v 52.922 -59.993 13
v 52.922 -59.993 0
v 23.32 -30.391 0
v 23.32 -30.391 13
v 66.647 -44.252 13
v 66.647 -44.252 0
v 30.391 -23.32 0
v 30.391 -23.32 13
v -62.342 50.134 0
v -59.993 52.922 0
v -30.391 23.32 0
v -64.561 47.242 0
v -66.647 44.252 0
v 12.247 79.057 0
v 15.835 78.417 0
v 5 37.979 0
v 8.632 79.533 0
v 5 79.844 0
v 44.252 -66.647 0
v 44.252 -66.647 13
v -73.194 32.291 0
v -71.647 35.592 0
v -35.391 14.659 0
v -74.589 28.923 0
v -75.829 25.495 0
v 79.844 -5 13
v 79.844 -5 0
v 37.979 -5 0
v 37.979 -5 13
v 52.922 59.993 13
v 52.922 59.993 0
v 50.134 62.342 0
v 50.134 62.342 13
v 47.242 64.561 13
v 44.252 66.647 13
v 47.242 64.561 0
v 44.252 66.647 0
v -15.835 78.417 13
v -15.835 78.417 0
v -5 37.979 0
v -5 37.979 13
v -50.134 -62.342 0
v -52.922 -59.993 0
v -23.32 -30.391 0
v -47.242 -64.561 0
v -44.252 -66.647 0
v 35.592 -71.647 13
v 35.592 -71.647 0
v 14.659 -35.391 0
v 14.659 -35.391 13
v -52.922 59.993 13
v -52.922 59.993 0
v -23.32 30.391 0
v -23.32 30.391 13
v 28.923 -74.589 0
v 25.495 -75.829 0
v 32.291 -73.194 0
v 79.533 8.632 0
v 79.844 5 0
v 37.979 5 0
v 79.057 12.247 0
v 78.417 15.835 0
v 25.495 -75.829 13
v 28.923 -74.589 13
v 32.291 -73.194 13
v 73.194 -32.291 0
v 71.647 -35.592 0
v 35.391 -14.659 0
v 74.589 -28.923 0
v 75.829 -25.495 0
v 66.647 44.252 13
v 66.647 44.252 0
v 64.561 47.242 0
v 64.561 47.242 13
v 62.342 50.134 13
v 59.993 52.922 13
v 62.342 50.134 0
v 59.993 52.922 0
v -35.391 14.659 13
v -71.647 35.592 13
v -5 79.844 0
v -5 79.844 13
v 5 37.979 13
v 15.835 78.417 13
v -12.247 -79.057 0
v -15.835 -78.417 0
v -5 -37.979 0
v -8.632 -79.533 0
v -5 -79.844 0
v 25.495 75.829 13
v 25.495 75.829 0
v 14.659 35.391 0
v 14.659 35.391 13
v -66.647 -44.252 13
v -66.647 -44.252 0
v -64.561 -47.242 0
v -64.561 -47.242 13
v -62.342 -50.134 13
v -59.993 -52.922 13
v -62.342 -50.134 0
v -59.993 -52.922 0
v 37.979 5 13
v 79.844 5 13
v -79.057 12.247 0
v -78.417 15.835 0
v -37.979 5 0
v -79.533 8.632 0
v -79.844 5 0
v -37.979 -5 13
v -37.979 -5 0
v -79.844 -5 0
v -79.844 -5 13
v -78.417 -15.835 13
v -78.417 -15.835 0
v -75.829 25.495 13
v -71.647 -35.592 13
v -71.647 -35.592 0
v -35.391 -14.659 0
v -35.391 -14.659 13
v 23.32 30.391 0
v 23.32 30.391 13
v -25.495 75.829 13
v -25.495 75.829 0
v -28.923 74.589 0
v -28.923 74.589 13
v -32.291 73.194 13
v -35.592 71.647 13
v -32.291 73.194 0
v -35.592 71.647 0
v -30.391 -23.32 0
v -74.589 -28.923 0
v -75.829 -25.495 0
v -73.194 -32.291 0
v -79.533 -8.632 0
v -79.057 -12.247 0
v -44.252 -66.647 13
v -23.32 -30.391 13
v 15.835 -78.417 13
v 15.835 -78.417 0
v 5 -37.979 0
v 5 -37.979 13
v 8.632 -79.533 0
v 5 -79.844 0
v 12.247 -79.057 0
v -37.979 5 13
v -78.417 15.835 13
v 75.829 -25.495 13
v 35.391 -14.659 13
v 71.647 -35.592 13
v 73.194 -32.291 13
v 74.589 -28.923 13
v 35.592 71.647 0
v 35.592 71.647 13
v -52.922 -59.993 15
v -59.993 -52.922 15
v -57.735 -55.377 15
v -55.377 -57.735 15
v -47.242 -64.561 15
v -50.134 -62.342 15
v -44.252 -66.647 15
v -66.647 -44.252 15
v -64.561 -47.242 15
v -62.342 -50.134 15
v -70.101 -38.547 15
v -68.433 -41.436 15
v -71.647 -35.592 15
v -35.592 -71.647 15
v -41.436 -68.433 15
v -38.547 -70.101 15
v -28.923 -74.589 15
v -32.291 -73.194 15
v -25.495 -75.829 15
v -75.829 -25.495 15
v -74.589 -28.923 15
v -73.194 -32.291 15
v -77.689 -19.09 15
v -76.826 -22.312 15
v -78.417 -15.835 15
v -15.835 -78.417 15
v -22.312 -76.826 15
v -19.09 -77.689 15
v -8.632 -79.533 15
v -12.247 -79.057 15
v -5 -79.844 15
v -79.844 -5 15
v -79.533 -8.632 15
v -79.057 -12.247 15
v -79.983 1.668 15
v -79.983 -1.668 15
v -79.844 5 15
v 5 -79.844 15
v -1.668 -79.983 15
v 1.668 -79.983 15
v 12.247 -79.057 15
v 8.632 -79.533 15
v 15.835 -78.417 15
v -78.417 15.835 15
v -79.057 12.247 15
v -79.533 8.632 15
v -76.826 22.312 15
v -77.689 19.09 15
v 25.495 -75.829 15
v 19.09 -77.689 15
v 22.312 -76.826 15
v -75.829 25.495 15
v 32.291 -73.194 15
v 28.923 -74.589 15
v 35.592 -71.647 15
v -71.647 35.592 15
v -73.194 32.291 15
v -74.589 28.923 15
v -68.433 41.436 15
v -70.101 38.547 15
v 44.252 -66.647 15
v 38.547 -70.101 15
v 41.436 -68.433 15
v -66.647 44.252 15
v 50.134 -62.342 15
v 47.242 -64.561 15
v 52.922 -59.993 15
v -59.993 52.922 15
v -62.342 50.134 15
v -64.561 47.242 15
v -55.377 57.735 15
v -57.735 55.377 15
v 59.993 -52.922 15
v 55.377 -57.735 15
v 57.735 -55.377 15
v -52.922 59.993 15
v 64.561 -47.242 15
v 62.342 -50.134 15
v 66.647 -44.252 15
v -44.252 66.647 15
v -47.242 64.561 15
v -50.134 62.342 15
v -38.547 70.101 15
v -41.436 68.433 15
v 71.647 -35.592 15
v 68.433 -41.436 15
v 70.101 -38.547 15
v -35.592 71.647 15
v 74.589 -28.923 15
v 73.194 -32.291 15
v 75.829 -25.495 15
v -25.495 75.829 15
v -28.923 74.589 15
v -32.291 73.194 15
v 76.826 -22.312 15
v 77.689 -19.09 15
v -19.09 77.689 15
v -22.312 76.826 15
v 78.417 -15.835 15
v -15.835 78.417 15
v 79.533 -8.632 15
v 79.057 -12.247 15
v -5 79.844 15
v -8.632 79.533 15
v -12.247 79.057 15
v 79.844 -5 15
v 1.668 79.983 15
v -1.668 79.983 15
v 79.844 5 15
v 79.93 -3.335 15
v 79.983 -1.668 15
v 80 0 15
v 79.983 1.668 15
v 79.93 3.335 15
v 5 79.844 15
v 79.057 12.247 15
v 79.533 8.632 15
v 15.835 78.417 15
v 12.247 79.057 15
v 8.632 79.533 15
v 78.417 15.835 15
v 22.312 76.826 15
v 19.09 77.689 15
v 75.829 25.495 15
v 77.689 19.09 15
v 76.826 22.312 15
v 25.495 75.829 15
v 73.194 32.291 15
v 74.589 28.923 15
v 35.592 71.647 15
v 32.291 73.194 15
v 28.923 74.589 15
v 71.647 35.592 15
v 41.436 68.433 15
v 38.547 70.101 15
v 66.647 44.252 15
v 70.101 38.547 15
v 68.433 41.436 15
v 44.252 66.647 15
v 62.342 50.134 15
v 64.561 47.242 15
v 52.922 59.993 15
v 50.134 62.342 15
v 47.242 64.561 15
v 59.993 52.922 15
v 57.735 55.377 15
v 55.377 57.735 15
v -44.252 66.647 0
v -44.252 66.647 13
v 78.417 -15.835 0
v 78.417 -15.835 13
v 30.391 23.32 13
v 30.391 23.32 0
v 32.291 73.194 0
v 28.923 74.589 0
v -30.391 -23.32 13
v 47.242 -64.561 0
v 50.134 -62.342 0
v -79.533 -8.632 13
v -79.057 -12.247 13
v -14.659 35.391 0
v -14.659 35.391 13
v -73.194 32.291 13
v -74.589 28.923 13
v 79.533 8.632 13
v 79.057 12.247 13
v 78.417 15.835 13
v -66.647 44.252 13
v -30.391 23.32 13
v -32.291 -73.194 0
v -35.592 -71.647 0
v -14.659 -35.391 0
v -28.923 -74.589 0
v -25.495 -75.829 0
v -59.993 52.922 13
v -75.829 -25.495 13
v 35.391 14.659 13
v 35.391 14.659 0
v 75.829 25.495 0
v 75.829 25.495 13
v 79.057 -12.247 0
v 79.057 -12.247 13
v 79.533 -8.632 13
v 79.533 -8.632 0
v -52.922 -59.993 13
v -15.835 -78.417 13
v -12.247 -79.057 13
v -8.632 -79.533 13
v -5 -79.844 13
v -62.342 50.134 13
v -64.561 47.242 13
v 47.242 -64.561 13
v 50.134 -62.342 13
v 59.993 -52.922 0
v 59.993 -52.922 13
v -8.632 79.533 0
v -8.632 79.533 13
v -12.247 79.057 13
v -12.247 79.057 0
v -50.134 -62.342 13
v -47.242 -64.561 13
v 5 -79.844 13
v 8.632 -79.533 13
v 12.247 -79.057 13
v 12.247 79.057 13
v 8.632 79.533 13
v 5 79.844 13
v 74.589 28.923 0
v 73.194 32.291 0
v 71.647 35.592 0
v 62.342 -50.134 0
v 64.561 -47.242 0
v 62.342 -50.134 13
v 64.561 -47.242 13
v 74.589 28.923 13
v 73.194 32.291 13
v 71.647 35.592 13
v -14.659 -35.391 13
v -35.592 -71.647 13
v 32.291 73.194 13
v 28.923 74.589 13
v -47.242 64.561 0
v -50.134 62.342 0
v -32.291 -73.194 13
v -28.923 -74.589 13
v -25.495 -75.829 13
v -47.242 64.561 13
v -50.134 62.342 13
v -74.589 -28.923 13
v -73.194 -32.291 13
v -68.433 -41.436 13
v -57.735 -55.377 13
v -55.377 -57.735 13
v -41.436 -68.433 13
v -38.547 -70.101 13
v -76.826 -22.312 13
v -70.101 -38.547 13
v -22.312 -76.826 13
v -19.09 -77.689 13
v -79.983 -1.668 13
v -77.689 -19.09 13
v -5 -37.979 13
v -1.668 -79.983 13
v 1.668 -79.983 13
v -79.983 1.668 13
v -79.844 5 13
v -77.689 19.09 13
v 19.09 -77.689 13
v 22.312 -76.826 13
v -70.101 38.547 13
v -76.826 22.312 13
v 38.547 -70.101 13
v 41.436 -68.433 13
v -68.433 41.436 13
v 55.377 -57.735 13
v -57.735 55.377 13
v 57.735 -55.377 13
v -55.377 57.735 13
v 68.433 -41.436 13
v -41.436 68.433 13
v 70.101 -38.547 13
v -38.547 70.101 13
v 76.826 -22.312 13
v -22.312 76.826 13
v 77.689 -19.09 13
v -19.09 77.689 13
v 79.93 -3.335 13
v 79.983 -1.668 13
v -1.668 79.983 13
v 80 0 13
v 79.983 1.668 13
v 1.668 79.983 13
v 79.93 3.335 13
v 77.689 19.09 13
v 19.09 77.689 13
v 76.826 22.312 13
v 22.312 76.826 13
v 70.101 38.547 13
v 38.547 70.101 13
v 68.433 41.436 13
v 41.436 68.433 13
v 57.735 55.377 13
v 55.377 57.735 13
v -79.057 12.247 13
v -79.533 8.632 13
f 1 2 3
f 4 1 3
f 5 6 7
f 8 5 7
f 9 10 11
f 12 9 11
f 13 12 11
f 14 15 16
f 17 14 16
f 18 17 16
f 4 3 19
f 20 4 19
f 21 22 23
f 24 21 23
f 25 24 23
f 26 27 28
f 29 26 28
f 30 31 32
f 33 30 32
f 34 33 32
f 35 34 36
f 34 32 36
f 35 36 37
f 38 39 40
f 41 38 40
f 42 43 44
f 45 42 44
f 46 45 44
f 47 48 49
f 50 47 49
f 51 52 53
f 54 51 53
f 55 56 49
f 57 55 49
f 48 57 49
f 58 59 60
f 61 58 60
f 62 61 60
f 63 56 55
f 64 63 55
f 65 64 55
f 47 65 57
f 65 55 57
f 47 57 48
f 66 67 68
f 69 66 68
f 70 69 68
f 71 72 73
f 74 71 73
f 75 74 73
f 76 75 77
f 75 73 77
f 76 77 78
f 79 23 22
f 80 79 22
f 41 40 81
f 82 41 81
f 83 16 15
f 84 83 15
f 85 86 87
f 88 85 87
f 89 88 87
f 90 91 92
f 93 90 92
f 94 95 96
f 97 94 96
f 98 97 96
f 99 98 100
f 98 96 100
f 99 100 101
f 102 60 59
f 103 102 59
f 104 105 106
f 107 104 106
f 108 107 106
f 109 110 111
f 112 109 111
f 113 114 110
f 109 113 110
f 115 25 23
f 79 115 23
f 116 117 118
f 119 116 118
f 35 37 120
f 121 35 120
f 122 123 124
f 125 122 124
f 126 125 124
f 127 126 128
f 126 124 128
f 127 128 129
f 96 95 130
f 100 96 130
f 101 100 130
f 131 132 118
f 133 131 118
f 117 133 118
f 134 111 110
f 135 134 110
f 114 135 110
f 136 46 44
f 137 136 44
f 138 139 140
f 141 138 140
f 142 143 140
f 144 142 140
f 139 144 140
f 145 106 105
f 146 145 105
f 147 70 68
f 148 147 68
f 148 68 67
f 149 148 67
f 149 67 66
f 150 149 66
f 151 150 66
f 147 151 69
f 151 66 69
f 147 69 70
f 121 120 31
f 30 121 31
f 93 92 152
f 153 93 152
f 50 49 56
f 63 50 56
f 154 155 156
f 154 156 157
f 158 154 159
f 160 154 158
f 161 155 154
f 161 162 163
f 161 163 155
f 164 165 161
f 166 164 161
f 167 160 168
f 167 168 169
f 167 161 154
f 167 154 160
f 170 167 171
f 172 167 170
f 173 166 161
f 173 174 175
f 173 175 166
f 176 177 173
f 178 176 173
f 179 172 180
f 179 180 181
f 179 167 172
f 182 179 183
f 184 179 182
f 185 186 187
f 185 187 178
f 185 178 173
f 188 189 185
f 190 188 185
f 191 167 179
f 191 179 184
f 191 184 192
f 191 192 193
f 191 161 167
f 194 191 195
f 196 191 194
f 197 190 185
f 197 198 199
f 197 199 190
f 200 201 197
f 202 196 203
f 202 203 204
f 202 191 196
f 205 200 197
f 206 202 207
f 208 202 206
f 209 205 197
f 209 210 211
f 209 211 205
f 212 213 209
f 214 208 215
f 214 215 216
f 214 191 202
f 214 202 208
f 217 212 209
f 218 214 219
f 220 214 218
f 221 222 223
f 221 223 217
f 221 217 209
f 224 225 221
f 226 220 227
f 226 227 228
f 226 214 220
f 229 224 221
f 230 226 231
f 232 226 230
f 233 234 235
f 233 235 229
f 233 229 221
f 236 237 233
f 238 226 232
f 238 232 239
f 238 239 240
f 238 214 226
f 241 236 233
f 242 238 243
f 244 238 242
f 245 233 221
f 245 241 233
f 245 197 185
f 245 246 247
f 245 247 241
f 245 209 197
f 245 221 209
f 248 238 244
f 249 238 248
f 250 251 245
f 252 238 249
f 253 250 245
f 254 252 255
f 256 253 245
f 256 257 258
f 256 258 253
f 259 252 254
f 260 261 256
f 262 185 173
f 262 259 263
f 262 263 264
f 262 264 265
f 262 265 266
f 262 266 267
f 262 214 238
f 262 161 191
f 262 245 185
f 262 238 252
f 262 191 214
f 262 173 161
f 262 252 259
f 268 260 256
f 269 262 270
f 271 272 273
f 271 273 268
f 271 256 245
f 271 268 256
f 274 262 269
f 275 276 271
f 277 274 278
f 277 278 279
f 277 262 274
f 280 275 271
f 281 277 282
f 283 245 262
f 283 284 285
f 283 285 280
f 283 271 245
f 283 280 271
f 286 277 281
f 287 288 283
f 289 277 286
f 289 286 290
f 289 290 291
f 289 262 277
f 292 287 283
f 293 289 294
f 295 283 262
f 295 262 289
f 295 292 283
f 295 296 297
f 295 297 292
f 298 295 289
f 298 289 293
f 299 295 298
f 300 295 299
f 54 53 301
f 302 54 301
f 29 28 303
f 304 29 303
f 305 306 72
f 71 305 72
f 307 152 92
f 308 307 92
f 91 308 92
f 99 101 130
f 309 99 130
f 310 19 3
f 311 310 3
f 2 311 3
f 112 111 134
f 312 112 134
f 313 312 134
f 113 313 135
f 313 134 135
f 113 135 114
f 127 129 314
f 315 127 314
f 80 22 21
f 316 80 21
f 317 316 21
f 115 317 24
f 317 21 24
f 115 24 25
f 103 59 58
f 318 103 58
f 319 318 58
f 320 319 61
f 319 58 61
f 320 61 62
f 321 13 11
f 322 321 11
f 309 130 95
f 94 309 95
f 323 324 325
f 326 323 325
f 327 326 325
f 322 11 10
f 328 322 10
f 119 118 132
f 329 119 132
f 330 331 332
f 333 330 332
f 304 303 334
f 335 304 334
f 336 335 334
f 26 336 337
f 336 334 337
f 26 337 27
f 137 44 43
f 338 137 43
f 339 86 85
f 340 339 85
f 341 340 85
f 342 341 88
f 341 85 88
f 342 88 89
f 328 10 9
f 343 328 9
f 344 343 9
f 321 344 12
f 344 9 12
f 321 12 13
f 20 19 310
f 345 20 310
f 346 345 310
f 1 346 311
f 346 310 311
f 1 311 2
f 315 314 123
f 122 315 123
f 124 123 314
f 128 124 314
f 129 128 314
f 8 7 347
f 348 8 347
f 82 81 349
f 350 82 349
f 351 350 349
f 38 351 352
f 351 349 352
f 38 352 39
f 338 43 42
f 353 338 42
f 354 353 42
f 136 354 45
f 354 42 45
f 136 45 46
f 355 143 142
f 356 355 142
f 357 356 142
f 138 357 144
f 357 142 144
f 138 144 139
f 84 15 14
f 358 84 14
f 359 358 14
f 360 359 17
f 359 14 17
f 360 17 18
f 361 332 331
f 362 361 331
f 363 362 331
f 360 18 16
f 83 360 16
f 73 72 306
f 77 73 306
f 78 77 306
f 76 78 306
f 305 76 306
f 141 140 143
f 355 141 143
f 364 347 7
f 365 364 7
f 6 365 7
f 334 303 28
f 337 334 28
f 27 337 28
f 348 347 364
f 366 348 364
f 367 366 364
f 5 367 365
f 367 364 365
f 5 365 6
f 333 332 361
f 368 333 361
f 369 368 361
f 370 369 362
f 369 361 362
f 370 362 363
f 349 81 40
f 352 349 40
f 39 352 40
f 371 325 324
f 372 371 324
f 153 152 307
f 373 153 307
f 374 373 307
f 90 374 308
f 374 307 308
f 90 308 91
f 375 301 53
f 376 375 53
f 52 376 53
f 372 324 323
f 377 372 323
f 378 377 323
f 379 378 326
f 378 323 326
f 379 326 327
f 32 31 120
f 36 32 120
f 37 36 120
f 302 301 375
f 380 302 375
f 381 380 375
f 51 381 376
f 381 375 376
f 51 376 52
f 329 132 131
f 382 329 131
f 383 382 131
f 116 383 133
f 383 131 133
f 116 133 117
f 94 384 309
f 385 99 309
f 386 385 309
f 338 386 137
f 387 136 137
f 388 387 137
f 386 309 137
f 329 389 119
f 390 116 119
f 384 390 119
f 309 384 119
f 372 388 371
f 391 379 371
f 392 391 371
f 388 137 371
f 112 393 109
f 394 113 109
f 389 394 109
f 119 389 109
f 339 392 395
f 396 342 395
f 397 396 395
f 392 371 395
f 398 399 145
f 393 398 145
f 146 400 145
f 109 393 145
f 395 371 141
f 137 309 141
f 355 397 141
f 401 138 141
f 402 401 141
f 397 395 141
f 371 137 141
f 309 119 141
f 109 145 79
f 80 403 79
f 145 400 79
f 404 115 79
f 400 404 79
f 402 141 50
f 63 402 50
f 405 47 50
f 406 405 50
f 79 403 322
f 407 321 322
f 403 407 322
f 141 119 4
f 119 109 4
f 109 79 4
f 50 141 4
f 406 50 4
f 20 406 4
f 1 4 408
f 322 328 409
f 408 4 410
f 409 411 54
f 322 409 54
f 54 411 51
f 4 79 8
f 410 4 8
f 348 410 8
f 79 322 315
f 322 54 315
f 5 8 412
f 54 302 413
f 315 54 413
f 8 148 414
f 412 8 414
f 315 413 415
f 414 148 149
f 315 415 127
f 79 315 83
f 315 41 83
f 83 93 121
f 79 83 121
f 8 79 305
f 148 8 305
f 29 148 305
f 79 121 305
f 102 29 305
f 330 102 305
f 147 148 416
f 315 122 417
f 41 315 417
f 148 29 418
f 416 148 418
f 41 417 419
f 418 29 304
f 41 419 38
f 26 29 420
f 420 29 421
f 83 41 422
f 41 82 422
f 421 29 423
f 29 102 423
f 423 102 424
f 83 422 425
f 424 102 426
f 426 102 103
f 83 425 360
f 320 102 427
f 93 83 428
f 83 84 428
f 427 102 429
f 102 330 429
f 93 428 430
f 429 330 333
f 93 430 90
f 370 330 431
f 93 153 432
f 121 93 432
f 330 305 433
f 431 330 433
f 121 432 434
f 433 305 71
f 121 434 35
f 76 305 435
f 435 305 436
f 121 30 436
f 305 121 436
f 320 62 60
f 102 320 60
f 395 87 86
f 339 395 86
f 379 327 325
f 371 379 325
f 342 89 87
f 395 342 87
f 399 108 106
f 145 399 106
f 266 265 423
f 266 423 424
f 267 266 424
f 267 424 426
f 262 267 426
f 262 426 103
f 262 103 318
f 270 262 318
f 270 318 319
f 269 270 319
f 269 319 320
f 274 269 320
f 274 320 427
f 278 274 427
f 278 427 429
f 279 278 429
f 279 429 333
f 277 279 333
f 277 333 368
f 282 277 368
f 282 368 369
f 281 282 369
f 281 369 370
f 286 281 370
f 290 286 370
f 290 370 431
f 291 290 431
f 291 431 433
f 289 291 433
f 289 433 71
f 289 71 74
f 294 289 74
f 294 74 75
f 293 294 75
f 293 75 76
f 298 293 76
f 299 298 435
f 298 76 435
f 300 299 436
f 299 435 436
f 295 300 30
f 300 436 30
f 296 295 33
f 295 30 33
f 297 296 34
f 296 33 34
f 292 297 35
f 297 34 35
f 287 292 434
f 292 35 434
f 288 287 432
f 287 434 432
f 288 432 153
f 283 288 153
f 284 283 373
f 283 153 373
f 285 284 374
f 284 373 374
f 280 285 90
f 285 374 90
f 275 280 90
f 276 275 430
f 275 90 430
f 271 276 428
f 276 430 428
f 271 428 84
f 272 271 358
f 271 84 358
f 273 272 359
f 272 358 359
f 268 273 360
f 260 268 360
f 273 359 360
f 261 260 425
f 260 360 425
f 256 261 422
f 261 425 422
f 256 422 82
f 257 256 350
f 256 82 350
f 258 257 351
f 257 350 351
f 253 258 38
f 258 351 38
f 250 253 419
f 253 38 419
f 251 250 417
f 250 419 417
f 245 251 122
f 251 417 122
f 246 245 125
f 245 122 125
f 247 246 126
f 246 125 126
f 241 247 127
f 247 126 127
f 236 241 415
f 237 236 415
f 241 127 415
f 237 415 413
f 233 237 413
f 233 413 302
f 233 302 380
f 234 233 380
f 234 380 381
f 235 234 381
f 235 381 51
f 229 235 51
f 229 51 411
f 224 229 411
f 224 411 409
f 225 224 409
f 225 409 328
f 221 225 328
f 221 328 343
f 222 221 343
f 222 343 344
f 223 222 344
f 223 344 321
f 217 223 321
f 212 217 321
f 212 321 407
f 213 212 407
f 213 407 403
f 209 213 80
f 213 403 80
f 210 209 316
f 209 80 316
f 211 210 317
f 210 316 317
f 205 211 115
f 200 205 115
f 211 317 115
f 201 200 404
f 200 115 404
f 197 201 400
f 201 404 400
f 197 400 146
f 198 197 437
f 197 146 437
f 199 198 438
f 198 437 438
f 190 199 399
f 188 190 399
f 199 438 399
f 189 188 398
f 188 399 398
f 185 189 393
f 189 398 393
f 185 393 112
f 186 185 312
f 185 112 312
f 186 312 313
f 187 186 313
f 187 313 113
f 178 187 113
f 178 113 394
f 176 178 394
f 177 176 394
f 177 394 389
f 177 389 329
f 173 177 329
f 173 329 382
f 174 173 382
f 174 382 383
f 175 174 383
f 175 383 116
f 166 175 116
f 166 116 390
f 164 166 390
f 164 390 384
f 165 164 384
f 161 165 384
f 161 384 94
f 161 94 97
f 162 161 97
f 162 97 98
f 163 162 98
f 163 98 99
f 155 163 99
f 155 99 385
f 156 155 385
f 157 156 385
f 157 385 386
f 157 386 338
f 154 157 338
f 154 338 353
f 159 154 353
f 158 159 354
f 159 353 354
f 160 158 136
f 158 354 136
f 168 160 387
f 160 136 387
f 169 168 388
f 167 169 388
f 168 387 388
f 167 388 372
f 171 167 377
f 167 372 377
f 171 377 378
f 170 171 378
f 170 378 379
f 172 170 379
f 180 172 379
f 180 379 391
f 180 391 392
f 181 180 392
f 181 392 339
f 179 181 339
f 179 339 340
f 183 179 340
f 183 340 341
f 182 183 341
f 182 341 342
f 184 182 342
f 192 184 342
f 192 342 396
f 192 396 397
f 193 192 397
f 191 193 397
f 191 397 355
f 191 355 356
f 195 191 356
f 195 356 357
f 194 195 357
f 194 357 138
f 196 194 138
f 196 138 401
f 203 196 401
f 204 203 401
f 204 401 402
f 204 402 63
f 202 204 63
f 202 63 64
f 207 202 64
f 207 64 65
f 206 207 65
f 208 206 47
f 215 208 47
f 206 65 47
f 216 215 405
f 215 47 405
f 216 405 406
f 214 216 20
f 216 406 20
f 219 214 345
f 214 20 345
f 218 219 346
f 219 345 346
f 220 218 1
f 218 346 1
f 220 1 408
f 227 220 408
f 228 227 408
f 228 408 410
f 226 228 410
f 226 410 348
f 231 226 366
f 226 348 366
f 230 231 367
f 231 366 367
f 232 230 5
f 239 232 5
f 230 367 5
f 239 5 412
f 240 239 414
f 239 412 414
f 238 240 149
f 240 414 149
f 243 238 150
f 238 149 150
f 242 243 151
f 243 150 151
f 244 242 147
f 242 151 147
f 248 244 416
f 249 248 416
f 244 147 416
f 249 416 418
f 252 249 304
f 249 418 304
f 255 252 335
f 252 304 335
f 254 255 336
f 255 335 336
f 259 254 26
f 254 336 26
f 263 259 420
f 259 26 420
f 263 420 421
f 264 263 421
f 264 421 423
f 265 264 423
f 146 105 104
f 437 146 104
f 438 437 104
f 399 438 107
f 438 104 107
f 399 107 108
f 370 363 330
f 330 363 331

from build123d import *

# Parameters (mm, degrees)
BOSS_EXTRUDE1_START = 13
SKETCH1_R           = 80
BOSS_EXTRUDE1_DEPTH = 2
BOSS_EXTRUDE2_START = -15
BOSS_EXTRUDE2_DEPTH = 15
CIRPATTERN1_COUNT   = 24


with BuildPart() as part:
    # Sketch1 → Boss-Extrude1 (new body)
    with BuildSketch(Plane.XY.offset(BOSS_EXTRUDE1_START)):
        Circle(SKETCH1_R)
    extrude(amount=BOSS_EXTRUDE1_DEPTH)

    # Sketch3 → Boss-Extrude2 (add)
    with BuildSketch(Plane.XY.offset(15).offset(BOSS_EXTRUDE2_START)):
        with BuildLine():
            Line((-5, -79.843597113), (-5, -37.978770564))
            Line((-5, -37.978770564), (-15.835414431, -78.417087741))
            ThreePointArc((-15.835414431, -78.417087741), (-10.442095378, -79.31558891), (-5, -79.843597113))
        make_face()
    boss_extrude2 = extrude(amount=BOSS_EXTRUDE2_DEPTH)

    # CirPattern1: Boss-Extrude2 ×24 about axis
    cirpattern1_axis = Axis((0, 0, 0), (0, 0, 1))
    for i in range(1, CIRPATTERN1_COUNT):
        add(boss_extrude2.rotate(cirpattern1_axis, i * 360 / CIRPATTERN1_COUNT))


solid = part.part
